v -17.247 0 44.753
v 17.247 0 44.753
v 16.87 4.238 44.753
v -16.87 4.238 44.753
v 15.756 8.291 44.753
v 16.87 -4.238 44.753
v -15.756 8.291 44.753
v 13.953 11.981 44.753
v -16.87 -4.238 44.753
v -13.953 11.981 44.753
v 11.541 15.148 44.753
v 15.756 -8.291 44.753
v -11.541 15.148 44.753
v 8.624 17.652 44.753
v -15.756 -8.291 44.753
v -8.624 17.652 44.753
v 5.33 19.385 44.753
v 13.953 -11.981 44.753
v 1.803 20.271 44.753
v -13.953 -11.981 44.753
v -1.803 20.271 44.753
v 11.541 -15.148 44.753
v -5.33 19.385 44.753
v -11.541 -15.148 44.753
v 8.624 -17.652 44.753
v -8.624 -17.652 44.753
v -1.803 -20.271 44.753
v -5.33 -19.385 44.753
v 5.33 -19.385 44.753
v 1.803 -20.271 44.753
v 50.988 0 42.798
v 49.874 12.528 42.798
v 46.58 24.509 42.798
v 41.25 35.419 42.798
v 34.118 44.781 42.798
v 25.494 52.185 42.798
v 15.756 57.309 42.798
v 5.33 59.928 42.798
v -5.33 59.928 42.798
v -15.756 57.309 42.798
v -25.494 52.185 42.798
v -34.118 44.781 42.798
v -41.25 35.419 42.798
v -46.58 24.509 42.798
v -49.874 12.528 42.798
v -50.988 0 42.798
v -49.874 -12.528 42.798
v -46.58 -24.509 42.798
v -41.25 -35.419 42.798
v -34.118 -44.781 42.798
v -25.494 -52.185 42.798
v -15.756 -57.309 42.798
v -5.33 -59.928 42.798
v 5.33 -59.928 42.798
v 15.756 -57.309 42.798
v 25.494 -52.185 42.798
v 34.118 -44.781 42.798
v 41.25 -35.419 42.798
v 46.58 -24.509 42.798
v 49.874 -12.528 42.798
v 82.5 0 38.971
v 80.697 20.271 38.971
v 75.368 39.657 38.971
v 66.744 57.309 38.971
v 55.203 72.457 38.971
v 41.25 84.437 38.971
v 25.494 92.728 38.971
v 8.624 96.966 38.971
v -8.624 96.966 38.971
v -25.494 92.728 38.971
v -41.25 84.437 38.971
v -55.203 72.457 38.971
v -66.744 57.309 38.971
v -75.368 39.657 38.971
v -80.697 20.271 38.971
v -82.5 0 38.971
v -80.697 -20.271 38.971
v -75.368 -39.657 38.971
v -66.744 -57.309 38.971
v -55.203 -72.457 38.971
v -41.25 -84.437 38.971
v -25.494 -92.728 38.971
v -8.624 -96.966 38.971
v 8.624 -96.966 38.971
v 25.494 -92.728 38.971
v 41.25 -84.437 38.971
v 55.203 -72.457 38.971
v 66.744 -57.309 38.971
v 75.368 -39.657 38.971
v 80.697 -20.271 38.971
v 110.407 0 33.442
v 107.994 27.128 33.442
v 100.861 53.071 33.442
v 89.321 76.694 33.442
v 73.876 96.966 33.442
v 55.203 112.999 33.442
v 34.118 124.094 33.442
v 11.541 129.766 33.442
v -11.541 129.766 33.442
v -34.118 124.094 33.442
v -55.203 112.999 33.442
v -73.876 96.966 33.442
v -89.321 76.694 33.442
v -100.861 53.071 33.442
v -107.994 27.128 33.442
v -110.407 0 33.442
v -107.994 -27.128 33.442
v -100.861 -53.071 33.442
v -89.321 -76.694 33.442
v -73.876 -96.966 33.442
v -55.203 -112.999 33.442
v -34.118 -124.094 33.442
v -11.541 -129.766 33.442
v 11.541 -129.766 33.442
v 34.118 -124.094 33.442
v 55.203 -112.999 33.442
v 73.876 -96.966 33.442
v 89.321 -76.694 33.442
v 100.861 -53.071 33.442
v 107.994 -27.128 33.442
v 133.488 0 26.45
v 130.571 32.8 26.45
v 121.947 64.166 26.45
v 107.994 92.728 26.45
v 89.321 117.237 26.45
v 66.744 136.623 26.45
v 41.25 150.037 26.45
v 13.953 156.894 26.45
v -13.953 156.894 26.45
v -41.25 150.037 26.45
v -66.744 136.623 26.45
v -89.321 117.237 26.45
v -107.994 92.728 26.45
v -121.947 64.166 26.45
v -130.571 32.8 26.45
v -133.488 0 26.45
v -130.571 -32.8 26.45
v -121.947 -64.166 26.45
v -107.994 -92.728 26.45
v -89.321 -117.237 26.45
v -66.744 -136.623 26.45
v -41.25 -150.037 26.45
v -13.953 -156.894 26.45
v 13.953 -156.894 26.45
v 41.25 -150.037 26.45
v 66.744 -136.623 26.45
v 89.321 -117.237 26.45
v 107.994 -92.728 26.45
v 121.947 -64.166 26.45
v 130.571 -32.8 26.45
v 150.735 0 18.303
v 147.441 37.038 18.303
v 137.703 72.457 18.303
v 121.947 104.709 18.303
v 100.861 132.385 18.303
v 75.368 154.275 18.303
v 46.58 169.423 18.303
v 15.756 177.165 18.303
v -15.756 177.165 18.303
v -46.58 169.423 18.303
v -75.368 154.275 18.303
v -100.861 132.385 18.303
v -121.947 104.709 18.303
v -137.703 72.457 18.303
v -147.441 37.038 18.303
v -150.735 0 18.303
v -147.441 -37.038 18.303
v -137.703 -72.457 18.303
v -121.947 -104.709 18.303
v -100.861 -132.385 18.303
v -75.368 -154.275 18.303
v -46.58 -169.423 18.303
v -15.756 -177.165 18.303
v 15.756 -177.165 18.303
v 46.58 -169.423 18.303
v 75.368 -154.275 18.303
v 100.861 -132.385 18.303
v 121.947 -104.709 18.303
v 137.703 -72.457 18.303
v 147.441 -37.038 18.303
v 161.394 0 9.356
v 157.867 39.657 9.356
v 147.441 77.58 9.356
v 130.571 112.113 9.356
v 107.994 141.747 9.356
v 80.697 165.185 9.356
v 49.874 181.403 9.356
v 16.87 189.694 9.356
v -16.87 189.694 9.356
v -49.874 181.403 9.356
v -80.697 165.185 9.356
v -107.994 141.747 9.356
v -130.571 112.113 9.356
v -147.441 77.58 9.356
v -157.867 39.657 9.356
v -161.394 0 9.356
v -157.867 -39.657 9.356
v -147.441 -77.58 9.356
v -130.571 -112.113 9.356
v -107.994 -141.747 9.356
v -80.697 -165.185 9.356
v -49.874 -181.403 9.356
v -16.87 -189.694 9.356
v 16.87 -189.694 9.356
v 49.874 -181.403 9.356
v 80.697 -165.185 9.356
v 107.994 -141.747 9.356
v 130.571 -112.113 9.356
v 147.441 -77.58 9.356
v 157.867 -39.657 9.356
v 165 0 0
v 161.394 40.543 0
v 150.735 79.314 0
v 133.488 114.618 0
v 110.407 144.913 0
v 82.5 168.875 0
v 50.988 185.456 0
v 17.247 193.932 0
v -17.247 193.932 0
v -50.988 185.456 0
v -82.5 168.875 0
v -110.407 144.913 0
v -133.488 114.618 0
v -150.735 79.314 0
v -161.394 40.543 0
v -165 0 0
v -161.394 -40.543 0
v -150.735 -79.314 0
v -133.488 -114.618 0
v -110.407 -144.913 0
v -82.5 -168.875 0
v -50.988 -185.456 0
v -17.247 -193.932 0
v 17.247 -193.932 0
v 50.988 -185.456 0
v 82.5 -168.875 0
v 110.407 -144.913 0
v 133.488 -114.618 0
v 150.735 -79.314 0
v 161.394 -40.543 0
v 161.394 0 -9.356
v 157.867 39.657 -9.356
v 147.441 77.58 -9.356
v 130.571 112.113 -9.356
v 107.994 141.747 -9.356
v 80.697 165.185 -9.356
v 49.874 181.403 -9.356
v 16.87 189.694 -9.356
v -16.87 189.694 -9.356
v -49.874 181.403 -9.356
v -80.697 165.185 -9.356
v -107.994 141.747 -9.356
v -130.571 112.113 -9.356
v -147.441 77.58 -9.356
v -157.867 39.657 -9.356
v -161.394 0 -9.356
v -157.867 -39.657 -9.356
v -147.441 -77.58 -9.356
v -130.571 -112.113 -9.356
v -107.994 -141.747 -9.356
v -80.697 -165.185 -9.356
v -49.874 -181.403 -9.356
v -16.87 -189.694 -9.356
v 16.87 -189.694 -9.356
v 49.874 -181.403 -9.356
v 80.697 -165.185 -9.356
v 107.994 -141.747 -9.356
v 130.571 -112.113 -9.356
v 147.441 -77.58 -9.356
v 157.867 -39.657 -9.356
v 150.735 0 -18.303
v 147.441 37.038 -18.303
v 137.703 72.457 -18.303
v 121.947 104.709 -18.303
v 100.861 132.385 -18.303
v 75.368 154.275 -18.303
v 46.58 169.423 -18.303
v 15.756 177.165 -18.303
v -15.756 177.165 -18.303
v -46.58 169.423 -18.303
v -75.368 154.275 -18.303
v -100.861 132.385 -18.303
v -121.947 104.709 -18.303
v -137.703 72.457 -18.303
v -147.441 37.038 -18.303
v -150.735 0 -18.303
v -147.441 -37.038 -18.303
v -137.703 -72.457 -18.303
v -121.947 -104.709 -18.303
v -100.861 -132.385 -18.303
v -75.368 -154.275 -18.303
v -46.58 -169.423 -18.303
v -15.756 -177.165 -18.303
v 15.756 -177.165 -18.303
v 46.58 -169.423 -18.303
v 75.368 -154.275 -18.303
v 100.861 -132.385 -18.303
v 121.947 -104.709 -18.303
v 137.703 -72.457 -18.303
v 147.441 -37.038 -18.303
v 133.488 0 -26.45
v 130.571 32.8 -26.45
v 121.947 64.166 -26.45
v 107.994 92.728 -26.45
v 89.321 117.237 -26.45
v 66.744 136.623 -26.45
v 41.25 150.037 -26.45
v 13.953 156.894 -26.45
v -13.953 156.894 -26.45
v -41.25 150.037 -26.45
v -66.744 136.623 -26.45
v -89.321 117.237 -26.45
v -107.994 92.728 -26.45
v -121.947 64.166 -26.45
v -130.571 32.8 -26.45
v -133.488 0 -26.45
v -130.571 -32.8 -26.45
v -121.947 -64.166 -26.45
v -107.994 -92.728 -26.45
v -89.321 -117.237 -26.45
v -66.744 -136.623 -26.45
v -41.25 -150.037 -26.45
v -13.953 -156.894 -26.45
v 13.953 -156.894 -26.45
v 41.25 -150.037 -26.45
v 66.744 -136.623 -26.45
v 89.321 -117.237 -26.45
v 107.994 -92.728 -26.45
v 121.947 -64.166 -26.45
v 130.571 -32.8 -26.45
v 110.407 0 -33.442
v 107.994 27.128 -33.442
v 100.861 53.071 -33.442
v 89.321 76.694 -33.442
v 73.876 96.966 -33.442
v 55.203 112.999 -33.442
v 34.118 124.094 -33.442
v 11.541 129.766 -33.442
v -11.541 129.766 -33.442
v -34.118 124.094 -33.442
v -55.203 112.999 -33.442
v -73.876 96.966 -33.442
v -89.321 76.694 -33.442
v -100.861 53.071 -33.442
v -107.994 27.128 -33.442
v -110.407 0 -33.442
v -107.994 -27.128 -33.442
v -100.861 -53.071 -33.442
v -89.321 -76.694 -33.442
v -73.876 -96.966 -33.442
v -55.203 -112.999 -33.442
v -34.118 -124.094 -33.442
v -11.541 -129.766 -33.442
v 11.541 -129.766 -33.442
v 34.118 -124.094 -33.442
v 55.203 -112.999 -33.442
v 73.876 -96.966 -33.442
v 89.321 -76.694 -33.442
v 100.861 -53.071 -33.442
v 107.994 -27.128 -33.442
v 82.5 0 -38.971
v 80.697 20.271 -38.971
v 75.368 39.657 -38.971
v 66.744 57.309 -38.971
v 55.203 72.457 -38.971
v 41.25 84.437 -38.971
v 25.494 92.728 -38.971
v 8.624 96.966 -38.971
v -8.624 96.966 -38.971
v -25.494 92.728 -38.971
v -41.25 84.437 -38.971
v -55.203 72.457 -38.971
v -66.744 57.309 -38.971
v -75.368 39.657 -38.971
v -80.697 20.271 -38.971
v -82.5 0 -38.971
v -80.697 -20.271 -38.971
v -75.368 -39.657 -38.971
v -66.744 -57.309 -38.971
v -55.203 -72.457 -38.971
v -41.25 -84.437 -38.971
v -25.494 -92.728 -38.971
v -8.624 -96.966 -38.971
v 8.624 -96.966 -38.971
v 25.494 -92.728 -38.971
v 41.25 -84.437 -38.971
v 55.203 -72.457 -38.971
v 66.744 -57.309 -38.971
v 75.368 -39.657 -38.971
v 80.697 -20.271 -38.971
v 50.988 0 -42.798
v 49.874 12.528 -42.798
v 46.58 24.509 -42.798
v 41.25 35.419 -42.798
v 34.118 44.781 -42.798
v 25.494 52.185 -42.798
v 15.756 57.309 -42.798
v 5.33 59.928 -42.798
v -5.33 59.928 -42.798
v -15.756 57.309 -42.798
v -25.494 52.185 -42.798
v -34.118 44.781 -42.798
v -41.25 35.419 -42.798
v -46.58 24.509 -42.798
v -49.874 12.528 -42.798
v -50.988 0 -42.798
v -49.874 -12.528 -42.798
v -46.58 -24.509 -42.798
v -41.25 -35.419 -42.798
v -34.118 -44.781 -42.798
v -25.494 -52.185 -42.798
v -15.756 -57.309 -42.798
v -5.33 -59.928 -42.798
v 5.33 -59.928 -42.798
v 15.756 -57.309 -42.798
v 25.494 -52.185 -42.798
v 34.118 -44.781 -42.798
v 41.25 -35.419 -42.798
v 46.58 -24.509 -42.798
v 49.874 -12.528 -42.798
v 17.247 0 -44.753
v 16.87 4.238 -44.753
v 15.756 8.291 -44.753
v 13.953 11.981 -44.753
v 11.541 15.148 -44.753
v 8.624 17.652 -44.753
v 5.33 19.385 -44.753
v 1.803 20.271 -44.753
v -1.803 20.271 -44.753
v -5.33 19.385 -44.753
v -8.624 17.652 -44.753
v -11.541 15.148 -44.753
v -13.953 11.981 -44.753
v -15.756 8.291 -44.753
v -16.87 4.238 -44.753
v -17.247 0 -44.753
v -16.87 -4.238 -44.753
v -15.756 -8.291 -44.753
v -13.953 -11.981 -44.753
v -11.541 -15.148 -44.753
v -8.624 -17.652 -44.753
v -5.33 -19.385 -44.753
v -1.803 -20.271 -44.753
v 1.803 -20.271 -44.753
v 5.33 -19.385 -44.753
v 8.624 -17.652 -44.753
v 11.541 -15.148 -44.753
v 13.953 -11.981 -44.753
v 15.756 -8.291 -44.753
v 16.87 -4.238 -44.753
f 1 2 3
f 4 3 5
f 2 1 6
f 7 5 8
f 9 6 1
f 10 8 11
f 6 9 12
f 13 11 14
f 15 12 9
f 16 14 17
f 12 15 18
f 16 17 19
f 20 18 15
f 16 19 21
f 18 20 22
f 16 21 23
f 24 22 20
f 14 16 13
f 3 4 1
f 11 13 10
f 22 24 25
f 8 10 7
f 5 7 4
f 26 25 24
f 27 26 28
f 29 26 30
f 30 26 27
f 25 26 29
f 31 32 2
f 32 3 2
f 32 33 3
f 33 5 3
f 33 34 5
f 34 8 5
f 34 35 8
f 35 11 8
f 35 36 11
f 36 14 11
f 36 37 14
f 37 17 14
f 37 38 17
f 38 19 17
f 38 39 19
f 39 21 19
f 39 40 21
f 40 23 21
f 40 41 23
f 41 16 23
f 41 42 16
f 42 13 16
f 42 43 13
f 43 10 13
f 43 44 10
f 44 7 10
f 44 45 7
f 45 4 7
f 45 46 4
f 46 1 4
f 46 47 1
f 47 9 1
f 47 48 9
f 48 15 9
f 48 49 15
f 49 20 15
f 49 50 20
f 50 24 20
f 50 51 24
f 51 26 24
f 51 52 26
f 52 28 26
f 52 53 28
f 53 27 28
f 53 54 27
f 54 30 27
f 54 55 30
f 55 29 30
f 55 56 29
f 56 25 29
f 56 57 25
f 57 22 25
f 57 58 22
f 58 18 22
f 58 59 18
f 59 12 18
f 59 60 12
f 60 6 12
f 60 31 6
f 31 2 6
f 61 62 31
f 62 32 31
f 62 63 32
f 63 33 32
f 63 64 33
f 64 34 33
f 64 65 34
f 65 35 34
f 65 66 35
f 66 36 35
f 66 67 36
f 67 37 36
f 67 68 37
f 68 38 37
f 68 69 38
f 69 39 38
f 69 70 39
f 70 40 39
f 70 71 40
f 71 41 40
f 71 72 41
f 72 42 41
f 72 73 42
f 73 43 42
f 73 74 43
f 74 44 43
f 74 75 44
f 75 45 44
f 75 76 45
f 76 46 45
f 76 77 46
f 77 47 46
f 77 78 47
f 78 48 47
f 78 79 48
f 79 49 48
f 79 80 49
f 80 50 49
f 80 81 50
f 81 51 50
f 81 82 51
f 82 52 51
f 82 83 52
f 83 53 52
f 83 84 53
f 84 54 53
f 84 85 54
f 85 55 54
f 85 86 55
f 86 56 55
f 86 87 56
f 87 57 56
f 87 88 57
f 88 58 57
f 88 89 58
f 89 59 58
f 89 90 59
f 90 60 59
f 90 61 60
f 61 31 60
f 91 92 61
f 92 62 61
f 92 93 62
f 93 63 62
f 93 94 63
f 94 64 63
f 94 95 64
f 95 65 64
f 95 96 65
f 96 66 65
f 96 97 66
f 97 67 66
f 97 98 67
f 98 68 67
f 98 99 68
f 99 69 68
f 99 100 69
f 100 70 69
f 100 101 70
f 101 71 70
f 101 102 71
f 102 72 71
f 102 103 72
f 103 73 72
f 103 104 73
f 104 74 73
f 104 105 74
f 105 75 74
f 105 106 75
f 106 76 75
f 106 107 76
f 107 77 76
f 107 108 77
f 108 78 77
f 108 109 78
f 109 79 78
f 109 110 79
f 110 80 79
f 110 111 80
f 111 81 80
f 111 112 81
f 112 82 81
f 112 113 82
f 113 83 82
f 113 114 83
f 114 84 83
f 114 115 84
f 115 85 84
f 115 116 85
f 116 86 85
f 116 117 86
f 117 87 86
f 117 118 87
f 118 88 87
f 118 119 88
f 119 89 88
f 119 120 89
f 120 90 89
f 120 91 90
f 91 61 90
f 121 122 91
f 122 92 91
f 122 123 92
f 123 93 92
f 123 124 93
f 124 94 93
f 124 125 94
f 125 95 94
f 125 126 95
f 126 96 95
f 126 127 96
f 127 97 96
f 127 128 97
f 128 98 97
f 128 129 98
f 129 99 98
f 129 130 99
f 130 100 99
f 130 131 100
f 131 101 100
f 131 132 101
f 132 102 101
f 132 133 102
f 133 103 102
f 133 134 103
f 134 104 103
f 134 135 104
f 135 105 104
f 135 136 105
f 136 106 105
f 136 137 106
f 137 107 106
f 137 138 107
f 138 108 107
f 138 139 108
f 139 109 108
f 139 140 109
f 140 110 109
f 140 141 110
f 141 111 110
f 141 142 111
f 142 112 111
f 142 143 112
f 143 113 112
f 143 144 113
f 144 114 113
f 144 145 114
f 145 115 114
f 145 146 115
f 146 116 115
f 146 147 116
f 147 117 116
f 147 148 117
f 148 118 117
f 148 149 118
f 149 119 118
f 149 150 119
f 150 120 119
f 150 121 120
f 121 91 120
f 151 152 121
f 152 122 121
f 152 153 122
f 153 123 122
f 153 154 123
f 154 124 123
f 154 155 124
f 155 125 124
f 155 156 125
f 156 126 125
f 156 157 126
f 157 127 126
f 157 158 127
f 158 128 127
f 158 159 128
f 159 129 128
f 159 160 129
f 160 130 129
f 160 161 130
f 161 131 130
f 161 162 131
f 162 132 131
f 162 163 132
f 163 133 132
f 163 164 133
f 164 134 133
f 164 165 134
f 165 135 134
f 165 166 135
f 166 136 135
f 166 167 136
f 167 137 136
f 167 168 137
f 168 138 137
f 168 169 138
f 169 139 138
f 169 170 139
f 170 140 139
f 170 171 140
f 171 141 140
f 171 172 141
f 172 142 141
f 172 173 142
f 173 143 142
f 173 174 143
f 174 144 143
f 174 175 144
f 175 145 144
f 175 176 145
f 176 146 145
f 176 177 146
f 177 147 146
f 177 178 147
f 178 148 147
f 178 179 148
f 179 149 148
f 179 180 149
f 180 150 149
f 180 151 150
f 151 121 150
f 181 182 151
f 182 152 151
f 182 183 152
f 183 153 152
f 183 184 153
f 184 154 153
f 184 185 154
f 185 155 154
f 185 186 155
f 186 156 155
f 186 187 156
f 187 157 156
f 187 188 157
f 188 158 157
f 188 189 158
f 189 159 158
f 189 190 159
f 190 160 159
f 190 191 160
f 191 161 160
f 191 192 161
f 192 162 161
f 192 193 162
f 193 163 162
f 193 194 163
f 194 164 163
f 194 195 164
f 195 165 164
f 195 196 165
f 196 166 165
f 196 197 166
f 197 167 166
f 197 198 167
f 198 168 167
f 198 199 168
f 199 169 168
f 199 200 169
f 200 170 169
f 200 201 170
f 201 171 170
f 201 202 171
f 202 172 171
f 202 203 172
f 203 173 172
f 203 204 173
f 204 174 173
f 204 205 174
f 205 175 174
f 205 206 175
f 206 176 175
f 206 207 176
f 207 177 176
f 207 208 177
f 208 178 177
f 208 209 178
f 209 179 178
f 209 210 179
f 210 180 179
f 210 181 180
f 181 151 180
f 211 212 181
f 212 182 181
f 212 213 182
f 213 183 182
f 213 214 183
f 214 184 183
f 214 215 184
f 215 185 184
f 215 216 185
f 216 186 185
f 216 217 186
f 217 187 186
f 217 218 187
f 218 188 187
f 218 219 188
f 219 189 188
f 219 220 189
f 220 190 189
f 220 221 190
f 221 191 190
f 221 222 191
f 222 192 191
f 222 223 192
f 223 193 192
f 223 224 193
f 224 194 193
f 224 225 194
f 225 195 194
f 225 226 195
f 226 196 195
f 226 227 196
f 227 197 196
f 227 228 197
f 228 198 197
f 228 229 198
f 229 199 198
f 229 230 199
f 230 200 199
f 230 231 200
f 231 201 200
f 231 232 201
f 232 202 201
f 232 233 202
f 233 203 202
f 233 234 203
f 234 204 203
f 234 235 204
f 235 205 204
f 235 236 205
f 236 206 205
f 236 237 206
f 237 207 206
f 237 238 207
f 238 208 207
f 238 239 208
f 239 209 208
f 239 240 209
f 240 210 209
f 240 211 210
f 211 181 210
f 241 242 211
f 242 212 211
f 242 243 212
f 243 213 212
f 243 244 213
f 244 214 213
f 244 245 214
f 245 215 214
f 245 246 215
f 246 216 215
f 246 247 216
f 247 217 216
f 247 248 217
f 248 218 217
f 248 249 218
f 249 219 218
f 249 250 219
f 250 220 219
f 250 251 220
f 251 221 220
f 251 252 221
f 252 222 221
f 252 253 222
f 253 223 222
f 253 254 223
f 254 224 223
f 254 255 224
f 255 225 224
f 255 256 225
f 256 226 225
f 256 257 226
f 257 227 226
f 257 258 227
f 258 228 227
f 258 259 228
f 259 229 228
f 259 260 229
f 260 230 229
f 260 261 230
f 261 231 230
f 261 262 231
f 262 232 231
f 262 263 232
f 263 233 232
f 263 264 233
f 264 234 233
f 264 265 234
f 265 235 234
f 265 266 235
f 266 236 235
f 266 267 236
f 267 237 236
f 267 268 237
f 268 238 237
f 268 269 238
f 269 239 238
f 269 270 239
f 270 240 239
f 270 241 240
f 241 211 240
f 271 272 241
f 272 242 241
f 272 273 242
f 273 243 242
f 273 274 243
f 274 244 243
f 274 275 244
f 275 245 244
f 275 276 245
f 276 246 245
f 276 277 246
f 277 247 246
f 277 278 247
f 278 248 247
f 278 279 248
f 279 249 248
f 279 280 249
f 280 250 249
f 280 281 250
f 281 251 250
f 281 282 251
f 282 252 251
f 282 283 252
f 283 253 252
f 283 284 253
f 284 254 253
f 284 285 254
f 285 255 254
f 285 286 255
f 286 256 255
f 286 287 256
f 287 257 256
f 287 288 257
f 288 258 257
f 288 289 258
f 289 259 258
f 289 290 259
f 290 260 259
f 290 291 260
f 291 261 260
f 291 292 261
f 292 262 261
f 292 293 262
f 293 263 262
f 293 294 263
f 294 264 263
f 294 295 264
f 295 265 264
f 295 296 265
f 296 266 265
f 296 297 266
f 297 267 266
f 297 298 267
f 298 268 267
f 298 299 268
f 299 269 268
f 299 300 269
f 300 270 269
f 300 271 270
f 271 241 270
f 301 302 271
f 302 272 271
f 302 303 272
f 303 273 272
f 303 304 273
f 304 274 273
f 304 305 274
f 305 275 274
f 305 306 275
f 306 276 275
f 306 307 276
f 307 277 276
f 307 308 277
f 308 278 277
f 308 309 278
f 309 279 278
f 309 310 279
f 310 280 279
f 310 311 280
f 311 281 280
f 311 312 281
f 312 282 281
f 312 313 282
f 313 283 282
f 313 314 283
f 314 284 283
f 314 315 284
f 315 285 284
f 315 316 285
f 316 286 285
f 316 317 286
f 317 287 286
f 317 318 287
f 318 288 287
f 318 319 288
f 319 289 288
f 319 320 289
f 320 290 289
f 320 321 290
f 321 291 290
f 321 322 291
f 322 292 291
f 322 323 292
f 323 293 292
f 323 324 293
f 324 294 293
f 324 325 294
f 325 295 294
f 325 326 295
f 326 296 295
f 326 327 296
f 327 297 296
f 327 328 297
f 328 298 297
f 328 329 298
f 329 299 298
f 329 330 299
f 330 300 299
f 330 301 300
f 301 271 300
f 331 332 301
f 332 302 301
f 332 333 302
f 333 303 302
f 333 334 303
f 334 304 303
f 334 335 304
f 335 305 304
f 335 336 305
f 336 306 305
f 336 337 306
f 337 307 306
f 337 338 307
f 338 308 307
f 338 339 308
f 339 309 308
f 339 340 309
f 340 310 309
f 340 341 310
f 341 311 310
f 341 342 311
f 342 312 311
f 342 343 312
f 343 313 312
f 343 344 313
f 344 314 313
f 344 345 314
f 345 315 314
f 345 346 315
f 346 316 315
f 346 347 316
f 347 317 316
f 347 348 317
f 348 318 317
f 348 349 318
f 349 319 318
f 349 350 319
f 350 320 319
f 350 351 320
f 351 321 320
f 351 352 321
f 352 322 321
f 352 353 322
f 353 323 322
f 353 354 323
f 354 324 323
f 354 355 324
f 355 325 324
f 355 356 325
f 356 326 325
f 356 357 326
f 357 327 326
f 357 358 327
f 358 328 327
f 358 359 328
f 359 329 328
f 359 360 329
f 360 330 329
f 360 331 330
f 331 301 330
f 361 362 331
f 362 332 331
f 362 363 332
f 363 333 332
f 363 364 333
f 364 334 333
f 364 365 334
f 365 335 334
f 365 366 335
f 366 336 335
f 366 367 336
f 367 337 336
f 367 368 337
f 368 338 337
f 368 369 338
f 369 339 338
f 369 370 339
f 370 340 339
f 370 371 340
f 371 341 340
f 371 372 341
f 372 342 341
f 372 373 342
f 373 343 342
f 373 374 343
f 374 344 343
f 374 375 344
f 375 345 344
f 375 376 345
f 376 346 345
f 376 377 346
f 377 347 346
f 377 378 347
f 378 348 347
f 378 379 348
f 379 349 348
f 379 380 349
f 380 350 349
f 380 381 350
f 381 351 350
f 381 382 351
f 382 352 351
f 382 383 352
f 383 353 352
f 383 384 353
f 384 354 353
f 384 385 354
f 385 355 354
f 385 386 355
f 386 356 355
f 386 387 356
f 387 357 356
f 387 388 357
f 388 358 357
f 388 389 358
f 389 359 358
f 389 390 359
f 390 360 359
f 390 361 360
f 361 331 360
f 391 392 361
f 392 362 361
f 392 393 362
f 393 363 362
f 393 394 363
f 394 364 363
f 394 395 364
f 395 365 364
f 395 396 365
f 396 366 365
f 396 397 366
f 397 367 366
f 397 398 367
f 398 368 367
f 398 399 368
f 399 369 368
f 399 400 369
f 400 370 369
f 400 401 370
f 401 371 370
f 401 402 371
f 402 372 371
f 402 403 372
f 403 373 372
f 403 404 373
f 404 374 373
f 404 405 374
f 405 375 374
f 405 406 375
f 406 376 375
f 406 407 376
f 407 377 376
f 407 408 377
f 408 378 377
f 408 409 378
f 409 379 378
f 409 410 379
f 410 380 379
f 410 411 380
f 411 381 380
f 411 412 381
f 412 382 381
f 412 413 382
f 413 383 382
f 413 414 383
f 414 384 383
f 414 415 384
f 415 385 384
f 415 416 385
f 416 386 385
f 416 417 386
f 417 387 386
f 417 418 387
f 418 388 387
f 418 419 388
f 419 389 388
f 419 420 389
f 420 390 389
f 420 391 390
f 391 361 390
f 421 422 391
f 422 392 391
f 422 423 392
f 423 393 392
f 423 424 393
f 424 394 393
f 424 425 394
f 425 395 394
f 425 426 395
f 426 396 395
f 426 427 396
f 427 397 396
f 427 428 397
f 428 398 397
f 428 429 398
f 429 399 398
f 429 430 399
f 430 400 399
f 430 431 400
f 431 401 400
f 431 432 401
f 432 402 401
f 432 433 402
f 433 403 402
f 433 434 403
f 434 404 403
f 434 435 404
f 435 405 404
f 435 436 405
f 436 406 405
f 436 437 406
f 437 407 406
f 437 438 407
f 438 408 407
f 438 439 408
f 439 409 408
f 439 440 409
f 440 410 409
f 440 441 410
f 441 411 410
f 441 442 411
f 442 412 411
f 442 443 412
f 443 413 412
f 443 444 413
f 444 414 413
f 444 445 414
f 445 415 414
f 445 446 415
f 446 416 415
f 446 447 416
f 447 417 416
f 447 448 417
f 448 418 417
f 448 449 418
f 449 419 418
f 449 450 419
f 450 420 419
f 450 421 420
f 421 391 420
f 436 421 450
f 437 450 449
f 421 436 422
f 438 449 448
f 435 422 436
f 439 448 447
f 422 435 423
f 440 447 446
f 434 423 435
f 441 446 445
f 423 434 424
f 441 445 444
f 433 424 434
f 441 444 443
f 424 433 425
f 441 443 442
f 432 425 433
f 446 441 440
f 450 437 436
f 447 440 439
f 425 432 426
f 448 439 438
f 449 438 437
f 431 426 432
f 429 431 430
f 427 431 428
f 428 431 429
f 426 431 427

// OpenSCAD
// Generated by SolidPython 1.0.1 on 2020-07-29 00:46:49


scale(v = [11, 13, 3]) {
	sphere(r = 15);
}
/***********************************************
*********      SolidPython code:      **********
************************************************
 
# import packages: SolidPython
from solid import *
from solid.utils import *
from itertools import chain, combinations, permutations


class Resize:

    def __init__(self, scad_file):
        self.scad_file = scad_file
        #self.scad_file = import_scad(scad_file)
        # cone/cylinder param:
        self.r1 = 0
        self.r2 = 0
        self.h = 0
        # rectangular prism param:
        self.w = 0
        self.l = 0
        # ellipse param:
        self.r = 0

    # import OpenScad code (file name corresponds to shape)


    # classify shape + parameters
    def assign(self, param1, param2, param3):
        if self.scad_file == 'cone.scad':
            self.r1 = param1
            self.r2 = param2
            self.h = param3
        elif self.scad_file == 'cylinder.scad':
            self.r1 = param1
            self.r2 = param2
            self.h = param3
        elif self.scad_file == 'rectangularPrism.scad':
            self.h = param1
            self.l = param2
            self.w = param3
        else:
            self.r = param1
            self.h = param2

    # resize parameters
    def iterate(self):
        x = range(3, 20, 2)
        i = 1
        if self.scad_file == 'cone.scad':
            tempList = list(permutations(x, 2))
            for temp in tempList:
                param1 = temp[0]
                param2 = temp[1]
                filepath = 'produced_scad_files/' + 'cone' + str(param1) + '_' + str(param2) + '_' + '.scad'
                scad_render_to_file(cylinder(h=param1, r1=param2, r2=0), filepath)

        elif self.scad_file == 'cylinder.scad':
            tempList = list(permutations(x, 3))
            for temp in tempList:
                param1 = temp[0]
                param2 = temp[1]
                filepath = 'produced_scad_files/' + 'cylinder' + str(param1) + '_' + str(param2) + '_' + '.scad'
                scad_render_to_file(cylinder(h=param1, r1=param2, r2=param2), filepath)

        elif self.scad_file == 'rectangularPrism.scad':
            tempList = list(permutations(x, 3))
            for temp in tempList:
                param1 = temp[0]
                param2 = temp[1]
                param3 = temp[2]
                filepath = 'produced_scad_files/' + 'rectangularPrism' + str(param1) + '_' + str(param2) + '_' + str(
                    param3) + '.scad'
                scad_render_to_file(cube(size=(param1, param2, param3)), filepath)

        elif self.scad_file == 'ellipse.scad':
            tempList = list(permutations(x, 4))
            for temp in tempList:
                param1 = temp[0]
                param2 = temp[1]
                param3 = temp[2]
                param4 = temp[3]
                filepath = 'produced_scad_files/' + 'ellipse' + str(param1) + '_' + str(param2) + '_' + str(param3) + '_' + str(param4) + '.scad'
                scad_render_to_file(scale([param1, param2, param3])(sphere(r=param4)), filepath)

    def render_to_scadfile(self):
        scad_render_to_file(scad, 'example.scad') 
 
************************************************/
